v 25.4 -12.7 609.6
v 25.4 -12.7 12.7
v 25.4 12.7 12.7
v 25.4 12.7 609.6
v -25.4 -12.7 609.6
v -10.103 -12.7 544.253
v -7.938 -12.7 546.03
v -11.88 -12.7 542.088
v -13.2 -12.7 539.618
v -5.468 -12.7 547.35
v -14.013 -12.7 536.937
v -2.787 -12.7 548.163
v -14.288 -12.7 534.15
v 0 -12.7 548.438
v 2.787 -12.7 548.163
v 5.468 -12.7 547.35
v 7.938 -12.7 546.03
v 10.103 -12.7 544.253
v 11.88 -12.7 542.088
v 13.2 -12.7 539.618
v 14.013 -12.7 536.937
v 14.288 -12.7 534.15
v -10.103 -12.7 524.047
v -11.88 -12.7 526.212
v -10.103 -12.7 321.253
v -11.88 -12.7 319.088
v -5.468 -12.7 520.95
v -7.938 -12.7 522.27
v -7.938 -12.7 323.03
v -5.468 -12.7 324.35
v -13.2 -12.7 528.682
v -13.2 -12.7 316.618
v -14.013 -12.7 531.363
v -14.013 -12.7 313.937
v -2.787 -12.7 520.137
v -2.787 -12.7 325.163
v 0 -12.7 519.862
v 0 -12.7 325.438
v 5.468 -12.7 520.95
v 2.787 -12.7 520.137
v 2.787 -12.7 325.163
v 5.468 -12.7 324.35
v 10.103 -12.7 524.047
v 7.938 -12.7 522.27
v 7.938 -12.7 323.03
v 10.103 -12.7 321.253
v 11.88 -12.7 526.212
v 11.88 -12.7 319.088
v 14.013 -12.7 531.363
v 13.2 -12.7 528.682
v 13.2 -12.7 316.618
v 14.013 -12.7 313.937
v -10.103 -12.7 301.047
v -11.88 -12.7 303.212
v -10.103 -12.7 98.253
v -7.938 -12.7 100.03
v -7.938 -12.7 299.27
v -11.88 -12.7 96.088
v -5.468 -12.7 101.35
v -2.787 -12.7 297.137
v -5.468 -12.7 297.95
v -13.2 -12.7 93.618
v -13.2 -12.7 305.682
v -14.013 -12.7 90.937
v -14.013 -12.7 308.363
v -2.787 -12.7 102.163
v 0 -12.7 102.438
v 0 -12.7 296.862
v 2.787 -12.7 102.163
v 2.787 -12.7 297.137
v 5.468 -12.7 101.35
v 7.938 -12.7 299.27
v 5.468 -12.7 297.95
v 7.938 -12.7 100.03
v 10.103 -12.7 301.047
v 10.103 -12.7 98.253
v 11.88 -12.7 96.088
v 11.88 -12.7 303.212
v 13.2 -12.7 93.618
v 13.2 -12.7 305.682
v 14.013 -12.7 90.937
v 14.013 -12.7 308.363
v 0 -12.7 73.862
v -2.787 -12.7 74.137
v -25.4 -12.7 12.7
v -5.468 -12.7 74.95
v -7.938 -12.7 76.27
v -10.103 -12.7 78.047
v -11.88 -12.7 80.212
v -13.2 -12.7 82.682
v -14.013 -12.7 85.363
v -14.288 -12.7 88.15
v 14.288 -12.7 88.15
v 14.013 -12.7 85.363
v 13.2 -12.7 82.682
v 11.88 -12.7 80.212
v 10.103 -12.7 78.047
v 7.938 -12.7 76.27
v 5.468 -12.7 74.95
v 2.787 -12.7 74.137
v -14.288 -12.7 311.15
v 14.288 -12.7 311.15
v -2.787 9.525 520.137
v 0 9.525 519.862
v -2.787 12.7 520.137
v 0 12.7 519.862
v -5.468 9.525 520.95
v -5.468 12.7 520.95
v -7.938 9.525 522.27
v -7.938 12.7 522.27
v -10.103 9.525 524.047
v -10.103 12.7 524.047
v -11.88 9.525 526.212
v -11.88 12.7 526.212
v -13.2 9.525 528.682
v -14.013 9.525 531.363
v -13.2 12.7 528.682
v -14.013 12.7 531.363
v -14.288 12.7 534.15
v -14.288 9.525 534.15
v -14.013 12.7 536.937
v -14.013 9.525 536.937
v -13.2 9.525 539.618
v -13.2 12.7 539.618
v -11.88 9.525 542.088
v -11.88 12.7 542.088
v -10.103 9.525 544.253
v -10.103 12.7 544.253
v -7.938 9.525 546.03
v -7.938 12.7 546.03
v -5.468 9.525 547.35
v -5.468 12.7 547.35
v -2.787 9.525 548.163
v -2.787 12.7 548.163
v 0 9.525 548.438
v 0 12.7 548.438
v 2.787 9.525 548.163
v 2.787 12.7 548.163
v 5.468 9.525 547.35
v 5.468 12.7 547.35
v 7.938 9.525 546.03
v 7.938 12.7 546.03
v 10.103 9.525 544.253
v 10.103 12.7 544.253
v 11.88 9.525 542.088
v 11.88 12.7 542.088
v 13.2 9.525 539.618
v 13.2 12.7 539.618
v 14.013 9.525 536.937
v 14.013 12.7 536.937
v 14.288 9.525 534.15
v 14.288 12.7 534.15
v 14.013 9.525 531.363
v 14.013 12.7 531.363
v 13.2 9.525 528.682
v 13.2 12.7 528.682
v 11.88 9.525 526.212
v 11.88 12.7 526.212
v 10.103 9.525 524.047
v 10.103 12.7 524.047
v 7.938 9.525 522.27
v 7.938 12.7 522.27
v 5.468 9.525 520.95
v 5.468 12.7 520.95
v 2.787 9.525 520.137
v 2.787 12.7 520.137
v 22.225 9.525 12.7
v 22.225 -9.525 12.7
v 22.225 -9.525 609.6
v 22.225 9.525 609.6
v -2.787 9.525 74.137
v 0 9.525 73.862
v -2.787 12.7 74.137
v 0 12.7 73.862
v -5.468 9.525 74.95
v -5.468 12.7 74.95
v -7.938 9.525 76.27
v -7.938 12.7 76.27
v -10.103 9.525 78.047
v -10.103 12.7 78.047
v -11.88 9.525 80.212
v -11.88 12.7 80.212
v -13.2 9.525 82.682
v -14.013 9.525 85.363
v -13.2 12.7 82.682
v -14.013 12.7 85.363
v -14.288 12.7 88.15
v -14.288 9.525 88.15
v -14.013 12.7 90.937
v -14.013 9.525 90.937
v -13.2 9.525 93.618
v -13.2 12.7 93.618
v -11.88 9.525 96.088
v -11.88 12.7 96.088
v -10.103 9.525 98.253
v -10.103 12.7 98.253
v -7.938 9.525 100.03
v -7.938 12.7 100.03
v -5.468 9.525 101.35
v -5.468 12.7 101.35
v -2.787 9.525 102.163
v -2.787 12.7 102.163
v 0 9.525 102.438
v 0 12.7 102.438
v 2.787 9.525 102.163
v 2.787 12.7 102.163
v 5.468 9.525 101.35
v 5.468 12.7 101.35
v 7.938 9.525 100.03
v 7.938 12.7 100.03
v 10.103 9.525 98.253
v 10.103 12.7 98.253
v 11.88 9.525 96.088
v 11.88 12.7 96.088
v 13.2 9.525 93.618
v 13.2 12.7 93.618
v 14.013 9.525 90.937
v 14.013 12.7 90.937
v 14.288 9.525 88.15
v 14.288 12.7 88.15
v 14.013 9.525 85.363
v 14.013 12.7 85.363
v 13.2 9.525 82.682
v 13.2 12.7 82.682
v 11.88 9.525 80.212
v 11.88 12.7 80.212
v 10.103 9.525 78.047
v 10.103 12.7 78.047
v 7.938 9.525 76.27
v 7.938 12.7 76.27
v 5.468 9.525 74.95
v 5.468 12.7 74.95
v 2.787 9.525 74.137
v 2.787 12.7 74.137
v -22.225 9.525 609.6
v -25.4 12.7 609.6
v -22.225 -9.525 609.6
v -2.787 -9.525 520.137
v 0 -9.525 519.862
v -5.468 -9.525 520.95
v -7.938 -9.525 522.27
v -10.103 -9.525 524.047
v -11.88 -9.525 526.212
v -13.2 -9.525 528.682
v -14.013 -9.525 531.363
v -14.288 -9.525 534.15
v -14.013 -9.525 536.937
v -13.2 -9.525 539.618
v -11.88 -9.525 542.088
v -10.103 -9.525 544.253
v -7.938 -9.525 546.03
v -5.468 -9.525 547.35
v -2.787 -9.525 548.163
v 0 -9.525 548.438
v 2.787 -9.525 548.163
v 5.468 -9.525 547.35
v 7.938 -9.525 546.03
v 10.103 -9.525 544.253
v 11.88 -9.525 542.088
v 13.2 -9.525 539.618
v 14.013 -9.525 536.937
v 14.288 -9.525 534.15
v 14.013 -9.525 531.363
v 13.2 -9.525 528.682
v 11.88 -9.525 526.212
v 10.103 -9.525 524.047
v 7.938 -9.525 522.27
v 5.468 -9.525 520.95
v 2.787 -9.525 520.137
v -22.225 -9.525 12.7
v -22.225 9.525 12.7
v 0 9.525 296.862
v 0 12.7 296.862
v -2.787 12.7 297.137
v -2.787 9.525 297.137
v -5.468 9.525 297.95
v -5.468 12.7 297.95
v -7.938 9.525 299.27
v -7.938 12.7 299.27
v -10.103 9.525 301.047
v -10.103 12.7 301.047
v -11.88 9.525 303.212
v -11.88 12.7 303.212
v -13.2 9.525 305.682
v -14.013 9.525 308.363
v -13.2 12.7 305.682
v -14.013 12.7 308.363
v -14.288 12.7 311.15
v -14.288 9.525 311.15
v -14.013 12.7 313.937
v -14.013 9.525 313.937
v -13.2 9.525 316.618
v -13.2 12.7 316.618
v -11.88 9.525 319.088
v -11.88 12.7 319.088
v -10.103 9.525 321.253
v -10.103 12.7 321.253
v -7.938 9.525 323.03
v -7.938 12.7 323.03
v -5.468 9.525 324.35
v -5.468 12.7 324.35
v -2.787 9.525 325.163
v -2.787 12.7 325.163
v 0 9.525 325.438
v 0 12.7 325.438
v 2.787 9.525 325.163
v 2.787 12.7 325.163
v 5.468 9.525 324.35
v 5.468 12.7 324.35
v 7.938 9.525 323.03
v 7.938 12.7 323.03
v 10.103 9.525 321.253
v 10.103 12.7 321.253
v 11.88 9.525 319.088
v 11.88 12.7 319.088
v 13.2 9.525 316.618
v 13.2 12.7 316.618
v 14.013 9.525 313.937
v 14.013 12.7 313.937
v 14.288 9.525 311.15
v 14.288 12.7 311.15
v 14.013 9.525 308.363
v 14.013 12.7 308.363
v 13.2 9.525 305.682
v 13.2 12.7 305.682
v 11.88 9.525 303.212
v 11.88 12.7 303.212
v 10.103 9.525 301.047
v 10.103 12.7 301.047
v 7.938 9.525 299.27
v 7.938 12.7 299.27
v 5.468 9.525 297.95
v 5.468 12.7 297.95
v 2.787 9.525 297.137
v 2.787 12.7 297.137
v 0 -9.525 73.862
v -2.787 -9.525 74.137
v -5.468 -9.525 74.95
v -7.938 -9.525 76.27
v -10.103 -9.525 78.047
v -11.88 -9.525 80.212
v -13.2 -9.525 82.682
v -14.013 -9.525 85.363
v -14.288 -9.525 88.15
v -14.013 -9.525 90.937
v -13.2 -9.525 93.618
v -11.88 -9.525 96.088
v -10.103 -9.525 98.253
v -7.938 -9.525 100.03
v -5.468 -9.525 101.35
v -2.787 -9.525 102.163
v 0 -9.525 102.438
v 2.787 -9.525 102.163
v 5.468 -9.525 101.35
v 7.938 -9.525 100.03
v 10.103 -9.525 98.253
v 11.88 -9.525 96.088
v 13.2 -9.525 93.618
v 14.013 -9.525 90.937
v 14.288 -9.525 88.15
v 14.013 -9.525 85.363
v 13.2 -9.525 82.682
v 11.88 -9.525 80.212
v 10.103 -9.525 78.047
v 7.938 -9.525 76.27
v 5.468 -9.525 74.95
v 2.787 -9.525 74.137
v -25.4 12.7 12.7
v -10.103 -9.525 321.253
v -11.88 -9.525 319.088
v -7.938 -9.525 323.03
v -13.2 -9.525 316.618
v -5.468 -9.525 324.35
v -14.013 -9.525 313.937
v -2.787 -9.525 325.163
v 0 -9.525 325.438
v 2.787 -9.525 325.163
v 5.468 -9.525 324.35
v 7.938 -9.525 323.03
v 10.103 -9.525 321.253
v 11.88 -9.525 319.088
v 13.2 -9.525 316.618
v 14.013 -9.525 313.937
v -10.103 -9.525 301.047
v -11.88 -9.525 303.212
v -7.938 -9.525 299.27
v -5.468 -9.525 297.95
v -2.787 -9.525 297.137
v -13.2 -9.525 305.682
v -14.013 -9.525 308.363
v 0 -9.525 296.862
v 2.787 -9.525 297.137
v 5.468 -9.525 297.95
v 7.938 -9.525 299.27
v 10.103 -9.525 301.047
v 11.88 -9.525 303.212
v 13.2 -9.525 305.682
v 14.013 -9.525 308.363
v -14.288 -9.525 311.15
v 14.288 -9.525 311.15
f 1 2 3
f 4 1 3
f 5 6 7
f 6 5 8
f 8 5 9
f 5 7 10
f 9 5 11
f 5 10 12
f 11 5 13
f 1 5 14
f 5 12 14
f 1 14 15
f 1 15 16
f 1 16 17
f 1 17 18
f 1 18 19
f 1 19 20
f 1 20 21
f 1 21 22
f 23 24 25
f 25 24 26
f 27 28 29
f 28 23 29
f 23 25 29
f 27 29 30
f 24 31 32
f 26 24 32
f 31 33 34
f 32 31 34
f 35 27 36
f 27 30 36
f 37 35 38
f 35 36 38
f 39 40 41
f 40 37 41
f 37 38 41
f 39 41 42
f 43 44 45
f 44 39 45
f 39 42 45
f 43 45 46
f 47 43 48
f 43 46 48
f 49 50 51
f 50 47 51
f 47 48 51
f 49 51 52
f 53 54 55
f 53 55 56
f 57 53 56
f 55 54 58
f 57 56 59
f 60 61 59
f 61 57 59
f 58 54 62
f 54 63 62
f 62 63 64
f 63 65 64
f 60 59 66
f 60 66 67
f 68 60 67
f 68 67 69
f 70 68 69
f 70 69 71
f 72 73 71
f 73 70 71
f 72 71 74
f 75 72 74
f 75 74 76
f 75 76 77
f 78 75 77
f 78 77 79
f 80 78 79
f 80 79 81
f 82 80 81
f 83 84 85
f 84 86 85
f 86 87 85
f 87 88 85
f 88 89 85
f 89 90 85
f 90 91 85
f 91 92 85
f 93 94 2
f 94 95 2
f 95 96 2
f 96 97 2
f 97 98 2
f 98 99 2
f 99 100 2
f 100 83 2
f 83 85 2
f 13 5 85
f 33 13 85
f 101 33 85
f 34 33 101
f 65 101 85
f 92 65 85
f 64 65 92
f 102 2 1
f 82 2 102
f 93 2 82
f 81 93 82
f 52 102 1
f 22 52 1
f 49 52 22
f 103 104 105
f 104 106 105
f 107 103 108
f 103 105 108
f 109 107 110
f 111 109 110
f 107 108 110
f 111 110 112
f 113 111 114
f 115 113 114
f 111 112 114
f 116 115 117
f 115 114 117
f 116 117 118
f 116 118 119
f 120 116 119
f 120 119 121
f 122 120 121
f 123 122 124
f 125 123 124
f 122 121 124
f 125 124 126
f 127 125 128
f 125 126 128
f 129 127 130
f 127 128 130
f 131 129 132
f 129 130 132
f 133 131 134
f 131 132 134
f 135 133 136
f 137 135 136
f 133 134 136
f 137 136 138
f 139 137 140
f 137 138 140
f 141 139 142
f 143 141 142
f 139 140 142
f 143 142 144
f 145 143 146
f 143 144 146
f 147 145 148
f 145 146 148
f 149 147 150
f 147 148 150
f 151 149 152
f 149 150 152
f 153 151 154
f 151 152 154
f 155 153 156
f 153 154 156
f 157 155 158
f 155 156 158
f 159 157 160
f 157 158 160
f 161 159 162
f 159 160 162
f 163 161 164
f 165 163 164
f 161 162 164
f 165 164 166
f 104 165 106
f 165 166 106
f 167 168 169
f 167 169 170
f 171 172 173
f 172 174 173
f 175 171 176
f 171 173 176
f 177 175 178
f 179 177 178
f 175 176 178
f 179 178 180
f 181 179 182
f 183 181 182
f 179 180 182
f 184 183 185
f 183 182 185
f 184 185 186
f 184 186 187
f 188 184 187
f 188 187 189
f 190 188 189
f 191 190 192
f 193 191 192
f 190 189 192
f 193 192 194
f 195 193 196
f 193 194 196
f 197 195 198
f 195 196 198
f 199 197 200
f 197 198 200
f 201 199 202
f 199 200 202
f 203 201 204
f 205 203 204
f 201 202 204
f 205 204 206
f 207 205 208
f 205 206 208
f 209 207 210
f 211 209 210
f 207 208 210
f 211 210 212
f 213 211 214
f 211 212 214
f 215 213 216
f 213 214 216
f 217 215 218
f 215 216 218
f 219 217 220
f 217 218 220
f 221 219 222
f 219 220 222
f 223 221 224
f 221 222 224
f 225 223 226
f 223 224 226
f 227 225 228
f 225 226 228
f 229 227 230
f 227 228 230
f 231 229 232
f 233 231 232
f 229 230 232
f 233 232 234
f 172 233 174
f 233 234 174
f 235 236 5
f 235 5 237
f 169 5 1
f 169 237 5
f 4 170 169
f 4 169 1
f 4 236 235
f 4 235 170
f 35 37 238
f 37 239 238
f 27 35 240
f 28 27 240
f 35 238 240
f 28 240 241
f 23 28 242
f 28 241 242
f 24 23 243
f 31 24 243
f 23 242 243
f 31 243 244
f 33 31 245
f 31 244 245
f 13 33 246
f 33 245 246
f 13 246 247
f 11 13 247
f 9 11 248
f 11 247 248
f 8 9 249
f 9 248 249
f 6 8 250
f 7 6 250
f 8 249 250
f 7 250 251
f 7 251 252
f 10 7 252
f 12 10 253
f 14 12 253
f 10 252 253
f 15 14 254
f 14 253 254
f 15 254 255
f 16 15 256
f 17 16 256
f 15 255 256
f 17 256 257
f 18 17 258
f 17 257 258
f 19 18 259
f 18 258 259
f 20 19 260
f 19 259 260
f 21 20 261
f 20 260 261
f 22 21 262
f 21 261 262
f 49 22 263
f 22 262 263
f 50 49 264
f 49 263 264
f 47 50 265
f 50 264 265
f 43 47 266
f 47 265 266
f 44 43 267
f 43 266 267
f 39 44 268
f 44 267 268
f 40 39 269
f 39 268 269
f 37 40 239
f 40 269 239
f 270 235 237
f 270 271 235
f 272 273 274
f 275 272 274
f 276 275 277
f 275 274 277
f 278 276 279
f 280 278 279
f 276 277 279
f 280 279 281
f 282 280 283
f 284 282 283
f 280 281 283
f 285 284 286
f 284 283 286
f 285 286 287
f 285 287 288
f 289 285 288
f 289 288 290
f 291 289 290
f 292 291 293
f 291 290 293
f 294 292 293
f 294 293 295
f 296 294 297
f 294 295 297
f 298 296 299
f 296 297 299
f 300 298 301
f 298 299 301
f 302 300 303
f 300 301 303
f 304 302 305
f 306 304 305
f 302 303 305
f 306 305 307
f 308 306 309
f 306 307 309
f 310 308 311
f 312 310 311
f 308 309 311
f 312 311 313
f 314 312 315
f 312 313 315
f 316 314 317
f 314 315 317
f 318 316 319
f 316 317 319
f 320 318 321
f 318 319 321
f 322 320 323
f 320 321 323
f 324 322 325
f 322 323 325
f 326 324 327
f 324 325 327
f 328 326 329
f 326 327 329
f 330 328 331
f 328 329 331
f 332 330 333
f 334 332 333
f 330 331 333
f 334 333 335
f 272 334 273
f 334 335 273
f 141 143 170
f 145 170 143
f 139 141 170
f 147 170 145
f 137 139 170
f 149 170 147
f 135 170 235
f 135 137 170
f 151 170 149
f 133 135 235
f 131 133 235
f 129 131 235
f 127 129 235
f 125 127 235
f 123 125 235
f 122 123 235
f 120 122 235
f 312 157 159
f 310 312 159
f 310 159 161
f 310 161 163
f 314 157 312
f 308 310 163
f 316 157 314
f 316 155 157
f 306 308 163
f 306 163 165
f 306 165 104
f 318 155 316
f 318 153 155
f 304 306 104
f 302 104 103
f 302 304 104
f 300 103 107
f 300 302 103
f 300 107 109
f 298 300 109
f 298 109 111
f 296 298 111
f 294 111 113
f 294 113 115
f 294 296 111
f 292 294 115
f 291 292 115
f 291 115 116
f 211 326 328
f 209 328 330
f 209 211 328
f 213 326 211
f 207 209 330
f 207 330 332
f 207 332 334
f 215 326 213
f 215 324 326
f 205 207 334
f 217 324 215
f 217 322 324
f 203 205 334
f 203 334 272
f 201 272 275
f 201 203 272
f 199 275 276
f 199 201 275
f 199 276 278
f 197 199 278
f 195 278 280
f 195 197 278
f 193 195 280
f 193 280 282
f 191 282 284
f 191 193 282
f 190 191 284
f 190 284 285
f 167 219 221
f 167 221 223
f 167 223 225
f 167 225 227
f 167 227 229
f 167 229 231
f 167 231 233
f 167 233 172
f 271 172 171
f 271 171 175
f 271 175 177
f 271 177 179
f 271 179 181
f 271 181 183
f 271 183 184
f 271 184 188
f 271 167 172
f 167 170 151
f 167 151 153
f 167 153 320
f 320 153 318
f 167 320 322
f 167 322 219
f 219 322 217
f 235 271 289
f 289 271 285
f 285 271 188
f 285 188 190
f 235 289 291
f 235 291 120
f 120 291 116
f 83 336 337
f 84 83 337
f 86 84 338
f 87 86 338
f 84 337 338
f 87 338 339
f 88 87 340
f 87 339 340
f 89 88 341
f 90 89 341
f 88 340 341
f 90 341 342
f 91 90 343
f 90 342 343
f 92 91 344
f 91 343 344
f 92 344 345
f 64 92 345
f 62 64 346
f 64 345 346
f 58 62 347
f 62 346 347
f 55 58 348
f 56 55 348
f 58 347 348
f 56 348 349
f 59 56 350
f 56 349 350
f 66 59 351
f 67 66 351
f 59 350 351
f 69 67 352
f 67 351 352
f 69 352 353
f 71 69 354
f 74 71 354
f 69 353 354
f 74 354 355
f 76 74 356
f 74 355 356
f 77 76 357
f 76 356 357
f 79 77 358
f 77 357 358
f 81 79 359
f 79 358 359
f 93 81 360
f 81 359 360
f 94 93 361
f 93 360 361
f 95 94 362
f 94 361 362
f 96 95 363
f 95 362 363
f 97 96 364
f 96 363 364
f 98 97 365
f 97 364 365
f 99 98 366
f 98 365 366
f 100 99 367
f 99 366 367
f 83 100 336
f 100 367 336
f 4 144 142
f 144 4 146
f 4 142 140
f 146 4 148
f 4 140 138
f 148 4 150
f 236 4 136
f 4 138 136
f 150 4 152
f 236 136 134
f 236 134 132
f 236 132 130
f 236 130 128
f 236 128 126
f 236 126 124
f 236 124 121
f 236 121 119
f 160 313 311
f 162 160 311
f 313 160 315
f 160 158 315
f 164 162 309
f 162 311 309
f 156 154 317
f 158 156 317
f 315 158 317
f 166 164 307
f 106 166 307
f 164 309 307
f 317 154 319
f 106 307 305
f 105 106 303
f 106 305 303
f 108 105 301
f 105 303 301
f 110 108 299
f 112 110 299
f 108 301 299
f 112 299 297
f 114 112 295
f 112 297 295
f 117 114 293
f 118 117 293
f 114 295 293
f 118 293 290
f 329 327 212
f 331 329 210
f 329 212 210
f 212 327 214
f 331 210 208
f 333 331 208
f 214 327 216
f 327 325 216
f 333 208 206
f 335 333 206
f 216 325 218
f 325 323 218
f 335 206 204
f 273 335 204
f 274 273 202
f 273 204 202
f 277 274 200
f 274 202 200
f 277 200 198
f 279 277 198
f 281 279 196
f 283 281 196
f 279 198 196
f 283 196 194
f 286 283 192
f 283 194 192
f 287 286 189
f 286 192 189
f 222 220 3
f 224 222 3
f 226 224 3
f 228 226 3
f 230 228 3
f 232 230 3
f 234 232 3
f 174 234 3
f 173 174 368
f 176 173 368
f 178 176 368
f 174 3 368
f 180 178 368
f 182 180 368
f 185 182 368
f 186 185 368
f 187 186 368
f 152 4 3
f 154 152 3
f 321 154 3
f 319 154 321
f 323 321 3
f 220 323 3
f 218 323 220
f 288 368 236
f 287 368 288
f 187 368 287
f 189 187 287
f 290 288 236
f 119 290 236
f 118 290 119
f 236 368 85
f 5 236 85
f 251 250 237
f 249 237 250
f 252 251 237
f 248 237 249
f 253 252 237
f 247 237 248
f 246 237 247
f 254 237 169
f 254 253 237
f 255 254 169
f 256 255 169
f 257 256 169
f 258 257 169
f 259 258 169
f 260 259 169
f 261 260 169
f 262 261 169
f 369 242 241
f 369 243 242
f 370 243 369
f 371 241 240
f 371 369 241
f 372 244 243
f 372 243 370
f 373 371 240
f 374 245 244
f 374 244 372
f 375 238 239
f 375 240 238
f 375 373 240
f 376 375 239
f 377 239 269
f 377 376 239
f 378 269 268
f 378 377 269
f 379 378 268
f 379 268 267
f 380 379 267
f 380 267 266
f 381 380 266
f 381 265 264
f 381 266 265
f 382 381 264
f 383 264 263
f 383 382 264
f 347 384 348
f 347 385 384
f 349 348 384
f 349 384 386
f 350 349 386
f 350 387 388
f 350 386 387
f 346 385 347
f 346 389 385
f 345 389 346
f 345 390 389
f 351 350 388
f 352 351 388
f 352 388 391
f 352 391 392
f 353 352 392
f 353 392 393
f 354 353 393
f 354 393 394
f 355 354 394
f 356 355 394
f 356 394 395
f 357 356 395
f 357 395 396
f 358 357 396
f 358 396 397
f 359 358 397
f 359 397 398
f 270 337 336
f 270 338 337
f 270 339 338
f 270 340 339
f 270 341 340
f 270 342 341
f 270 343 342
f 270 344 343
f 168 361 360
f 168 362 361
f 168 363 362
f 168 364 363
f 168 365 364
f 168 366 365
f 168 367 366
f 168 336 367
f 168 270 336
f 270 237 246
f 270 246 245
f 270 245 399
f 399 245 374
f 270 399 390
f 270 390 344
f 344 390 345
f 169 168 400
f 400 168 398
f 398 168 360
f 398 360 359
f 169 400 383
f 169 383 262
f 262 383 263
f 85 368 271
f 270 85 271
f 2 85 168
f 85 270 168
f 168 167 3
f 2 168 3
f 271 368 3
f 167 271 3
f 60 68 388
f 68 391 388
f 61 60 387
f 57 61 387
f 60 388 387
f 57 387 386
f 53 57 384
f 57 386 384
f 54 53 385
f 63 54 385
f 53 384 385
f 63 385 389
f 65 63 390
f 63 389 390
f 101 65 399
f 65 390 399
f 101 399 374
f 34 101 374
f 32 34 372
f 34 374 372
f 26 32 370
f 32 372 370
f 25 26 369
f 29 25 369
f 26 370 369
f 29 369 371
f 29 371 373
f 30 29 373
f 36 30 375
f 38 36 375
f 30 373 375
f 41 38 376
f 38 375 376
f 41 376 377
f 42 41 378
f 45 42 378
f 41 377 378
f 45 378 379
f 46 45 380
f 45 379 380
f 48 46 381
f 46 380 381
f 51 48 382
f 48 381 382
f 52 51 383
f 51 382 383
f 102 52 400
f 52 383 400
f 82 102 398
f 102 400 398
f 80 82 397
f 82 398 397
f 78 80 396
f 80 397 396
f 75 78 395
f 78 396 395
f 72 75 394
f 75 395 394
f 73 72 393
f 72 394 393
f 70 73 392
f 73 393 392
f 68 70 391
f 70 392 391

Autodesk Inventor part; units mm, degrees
ref_plane "Start Plane" through (0, 0, 12.7) normal (0, 0, 1) x (1, 0, 0)
ref_plane "End Plane" through (0, 0, 609.6) normal (0, 0, 1) x (1, 0, 0)
sketch "Sketch" plane through (0, 0, 0) normal (0, 0, 1) x (1, 0, 0)
  line L0 (-25.4, -12.7) -> (25.4, -12.7)
  line L1 (25.4, -12.7) -> (25.4, 12.7)
  line L2 (25.4, 12.7) -> (-25.4, 12.7)
  line L3 (-25.4, 12.7) -> (-25.4, -12.7)
  line L4 (-25.4, -12.7) -> (25.4, 12.7) construction
  line L5 (25.4, -12.7) -> (-25.4, 12.7) construction
  line L6 (-22.225, -9.525) -> (22.225, -9.525)
  line L7 (22.225, -9.525) -> (22.225, 9.525)
  line L8 (22.225, 9.525) -> (-22.225, 9.525)
  line L9 (-22.225, 9.525) -> (-22.225, -9.525)
  line L10 (-22.225, -9.525) -> (22.225, 9.525) construction
  line L11 (22.225, -9.525) -> (-22.225, 9.525) construction
  point P0 (0, 0)
  point P1 (0, 0)
  dimension "d0" = 50.8
  dimension "d1" = 25.4
  dimension "d2" = 3.175
  dimension "d3" = 3.175
extrude "Body" add sketch "Sketch" along normal up to surface (596.9 mm away) from surface at 12.7
sketch "Sketch4" plane through (0, 0, 0) normal (0, 0, 1) x (1, 0, 0)
  line L0 (0, 0) -> (10, 0)
ref_plane "Work Plane4" through (0, 0, 0) normal (0, -1, 0) x (1, 0, 0)
sketch "Sketch5" plane through (0, 0, 0) normal (0, -1, 0) x (1, 0, 0)
  line L0 (-2, 12.7) -> (12, 12.7)
  line L1 (-2, 609.6) -> (12, 609.6)
  dimension "d11" = 596.9
ref_plane "Work Plane5" through (25.4, 498.475, 12.7) normal (0, 0, -1) x (-1, 0, 0)
split "Split1" plane through (25.4, 498.475, 12.7) removes the side toward (0, 0, -1)
ref_plane "Work Plane6" through (25.4, -73.025, 609.6) normal (0, 0, 1) x (1, 0, 0)
split "Split2" plane through (25.4, -73.025, 609.6) removes the side toward (0, 0, 1)
sketch "Sketch6" plane through (-25.4, -12.7, 609.6) normal (0, -1, 0) x (1, 0, 0)
  line L0 (0, -203.2) -> (50.8, -203.2) projected
  line L1 (50.8, -393.7) -> (0, -393.7) projected
  line L2 (50.8, -596.9) -> (50.8, 0) projected
  line L3 (0, -596.9) -> (0, 0) projected
  point P0 (25.4, -298.45)
  point P1 (25.4, -75.45)
  point P2 (25.4, -521.45)
  dimension "d14" = 25.4
  dimension "d15" = 95.25
  dimension "d16" = 223
  dimension "d17" = 223
hole "Hole1" at (0, -12.7, 311.15) at (0, -12.7, 534.15) at (0, -12.7, 88.15) direction (0, 1, 0) diameter 28.575 end through all
equation "\"G_OFFSET_START\" = -12.7"
equation "\"G_OFFSET_END\" = -12.7"
equation "\"d6\" = -G_OFFSET_START"
equation "\"d7\" = length + G_OFFSET_END"
equation "\"G_L\" = d11"
equation "\"length\" = 622.3"
properties part number "2x1inTubing"
